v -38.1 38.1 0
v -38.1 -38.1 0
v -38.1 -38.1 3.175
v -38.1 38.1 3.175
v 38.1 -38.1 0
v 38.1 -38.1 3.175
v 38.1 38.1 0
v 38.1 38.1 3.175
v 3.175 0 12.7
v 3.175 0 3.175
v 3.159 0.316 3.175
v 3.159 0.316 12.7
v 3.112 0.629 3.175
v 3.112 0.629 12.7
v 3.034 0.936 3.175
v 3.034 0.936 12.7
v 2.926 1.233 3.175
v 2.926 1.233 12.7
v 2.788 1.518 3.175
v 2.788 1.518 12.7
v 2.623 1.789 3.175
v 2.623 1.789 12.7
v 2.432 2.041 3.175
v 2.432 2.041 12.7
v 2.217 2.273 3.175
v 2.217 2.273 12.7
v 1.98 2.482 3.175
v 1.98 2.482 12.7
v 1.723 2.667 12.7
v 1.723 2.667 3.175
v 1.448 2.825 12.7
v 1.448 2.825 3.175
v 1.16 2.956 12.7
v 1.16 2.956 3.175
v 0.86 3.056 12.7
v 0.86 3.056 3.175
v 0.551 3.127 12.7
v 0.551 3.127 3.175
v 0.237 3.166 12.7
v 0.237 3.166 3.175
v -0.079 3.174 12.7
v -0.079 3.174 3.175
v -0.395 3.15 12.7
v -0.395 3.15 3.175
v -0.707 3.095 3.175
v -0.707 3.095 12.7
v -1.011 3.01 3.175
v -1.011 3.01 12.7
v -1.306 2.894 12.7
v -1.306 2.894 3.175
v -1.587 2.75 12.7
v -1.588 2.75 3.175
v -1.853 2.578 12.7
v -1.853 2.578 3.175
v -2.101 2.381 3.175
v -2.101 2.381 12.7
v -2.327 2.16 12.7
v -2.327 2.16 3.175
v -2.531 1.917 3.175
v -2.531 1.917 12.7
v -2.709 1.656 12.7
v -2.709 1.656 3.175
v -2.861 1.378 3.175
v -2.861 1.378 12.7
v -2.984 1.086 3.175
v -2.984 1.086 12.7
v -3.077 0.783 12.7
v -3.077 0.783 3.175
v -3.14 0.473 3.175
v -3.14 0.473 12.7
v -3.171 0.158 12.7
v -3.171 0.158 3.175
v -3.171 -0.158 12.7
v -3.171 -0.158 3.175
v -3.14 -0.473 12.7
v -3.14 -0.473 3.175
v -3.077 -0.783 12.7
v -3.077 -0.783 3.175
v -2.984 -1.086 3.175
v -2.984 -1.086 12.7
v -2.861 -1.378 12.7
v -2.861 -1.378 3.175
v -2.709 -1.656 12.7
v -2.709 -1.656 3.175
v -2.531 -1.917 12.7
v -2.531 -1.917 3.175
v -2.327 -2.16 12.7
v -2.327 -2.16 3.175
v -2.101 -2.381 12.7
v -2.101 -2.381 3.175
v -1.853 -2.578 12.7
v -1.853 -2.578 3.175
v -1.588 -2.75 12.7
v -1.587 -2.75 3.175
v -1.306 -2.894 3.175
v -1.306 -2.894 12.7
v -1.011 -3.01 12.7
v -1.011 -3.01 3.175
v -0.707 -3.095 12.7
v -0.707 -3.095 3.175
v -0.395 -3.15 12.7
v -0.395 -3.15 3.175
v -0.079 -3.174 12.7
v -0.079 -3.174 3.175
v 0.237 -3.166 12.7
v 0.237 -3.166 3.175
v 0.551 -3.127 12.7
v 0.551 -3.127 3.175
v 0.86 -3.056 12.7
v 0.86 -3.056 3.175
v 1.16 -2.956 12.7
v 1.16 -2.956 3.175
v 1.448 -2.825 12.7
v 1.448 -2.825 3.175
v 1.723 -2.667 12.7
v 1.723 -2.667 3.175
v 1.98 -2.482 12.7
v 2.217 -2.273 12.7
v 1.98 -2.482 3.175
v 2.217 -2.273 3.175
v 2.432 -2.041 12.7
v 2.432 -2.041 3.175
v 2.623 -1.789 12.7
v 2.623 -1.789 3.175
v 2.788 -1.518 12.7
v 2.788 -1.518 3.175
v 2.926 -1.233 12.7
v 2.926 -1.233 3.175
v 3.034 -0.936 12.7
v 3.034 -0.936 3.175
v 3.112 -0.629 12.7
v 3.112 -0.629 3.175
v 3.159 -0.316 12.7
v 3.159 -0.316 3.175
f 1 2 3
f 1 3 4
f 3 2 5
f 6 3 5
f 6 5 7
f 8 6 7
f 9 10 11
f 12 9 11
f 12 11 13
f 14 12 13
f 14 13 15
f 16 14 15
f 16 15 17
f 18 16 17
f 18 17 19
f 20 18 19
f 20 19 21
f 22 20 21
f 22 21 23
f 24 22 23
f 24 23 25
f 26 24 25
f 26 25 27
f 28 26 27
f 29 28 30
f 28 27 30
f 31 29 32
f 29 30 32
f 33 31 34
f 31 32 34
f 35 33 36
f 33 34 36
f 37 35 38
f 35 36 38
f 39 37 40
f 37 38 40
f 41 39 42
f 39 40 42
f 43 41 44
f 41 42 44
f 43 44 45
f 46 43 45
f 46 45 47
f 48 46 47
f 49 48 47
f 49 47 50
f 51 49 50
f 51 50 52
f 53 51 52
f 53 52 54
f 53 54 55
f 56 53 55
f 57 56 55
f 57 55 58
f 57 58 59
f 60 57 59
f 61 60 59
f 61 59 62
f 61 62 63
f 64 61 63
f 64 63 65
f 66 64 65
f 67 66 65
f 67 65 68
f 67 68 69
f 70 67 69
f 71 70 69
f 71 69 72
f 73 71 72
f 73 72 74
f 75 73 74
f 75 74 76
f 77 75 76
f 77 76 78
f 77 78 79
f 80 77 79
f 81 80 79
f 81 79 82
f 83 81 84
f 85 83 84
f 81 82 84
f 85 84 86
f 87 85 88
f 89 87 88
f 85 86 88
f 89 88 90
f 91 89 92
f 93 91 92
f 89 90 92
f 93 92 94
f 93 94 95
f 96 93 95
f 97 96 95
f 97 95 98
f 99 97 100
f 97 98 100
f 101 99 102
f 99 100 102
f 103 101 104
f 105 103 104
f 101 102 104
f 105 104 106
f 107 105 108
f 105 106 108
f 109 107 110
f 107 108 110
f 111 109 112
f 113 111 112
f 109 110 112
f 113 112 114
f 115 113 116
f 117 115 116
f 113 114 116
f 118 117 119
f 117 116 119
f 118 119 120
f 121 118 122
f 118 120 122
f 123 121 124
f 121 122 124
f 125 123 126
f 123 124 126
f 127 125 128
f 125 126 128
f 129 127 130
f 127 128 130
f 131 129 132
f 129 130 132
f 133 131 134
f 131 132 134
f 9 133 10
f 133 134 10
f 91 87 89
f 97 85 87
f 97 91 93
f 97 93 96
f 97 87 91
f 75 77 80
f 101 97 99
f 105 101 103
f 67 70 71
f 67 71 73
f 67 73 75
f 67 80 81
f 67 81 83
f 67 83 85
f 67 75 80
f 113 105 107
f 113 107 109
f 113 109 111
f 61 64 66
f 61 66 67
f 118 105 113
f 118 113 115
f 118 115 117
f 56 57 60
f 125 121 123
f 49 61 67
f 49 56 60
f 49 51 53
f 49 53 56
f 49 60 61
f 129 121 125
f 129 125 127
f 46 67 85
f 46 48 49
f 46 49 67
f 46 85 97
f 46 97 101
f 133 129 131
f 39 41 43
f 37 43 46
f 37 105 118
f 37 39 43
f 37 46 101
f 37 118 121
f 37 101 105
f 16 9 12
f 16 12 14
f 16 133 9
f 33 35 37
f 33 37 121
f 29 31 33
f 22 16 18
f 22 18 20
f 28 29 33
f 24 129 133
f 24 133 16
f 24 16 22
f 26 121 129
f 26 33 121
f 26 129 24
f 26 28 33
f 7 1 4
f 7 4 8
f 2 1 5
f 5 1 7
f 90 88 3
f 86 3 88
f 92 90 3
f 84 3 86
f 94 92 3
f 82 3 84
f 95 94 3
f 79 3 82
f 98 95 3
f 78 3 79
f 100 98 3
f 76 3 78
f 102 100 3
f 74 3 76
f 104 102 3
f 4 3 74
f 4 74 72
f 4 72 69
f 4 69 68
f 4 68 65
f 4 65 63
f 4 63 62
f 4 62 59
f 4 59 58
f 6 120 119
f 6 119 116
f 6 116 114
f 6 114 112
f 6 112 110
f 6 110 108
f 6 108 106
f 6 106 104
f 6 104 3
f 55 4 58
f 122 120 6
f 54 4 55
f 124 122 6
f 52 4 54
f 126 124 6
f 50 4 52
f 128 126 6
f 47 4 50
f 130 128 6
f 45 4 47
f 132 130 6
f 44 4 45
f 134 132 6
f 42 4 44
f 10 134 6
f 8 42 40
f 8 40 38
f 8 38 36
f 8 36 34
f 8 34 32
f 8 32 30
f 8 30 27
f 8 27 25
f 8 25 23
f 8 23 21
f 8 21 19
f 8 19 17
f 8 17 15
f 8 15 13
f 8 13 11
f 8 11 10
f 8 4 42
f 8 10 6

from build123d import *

# Parameters (mm, degrees)
F0_R     = 3.175
F1_DEPTH = 12.7
F2_W     = 76.2
F2_H     = 76.2
F3_DEPTH = 3.175


with BuildPart() as f1:
    # F0 (on Top) → F1 (new body)
    with BuildSketch(Plane.XY):
        Circle(F0_R)
    extrude(amount=F1_DEPTH)

    # F2 (on Top) → F3 (join)
    with BuildSketch(Plane.XY):
        Rectangle(F2_W, F2_H)
    extrude(amount=F3_DEPTH)


solid = f1.part
